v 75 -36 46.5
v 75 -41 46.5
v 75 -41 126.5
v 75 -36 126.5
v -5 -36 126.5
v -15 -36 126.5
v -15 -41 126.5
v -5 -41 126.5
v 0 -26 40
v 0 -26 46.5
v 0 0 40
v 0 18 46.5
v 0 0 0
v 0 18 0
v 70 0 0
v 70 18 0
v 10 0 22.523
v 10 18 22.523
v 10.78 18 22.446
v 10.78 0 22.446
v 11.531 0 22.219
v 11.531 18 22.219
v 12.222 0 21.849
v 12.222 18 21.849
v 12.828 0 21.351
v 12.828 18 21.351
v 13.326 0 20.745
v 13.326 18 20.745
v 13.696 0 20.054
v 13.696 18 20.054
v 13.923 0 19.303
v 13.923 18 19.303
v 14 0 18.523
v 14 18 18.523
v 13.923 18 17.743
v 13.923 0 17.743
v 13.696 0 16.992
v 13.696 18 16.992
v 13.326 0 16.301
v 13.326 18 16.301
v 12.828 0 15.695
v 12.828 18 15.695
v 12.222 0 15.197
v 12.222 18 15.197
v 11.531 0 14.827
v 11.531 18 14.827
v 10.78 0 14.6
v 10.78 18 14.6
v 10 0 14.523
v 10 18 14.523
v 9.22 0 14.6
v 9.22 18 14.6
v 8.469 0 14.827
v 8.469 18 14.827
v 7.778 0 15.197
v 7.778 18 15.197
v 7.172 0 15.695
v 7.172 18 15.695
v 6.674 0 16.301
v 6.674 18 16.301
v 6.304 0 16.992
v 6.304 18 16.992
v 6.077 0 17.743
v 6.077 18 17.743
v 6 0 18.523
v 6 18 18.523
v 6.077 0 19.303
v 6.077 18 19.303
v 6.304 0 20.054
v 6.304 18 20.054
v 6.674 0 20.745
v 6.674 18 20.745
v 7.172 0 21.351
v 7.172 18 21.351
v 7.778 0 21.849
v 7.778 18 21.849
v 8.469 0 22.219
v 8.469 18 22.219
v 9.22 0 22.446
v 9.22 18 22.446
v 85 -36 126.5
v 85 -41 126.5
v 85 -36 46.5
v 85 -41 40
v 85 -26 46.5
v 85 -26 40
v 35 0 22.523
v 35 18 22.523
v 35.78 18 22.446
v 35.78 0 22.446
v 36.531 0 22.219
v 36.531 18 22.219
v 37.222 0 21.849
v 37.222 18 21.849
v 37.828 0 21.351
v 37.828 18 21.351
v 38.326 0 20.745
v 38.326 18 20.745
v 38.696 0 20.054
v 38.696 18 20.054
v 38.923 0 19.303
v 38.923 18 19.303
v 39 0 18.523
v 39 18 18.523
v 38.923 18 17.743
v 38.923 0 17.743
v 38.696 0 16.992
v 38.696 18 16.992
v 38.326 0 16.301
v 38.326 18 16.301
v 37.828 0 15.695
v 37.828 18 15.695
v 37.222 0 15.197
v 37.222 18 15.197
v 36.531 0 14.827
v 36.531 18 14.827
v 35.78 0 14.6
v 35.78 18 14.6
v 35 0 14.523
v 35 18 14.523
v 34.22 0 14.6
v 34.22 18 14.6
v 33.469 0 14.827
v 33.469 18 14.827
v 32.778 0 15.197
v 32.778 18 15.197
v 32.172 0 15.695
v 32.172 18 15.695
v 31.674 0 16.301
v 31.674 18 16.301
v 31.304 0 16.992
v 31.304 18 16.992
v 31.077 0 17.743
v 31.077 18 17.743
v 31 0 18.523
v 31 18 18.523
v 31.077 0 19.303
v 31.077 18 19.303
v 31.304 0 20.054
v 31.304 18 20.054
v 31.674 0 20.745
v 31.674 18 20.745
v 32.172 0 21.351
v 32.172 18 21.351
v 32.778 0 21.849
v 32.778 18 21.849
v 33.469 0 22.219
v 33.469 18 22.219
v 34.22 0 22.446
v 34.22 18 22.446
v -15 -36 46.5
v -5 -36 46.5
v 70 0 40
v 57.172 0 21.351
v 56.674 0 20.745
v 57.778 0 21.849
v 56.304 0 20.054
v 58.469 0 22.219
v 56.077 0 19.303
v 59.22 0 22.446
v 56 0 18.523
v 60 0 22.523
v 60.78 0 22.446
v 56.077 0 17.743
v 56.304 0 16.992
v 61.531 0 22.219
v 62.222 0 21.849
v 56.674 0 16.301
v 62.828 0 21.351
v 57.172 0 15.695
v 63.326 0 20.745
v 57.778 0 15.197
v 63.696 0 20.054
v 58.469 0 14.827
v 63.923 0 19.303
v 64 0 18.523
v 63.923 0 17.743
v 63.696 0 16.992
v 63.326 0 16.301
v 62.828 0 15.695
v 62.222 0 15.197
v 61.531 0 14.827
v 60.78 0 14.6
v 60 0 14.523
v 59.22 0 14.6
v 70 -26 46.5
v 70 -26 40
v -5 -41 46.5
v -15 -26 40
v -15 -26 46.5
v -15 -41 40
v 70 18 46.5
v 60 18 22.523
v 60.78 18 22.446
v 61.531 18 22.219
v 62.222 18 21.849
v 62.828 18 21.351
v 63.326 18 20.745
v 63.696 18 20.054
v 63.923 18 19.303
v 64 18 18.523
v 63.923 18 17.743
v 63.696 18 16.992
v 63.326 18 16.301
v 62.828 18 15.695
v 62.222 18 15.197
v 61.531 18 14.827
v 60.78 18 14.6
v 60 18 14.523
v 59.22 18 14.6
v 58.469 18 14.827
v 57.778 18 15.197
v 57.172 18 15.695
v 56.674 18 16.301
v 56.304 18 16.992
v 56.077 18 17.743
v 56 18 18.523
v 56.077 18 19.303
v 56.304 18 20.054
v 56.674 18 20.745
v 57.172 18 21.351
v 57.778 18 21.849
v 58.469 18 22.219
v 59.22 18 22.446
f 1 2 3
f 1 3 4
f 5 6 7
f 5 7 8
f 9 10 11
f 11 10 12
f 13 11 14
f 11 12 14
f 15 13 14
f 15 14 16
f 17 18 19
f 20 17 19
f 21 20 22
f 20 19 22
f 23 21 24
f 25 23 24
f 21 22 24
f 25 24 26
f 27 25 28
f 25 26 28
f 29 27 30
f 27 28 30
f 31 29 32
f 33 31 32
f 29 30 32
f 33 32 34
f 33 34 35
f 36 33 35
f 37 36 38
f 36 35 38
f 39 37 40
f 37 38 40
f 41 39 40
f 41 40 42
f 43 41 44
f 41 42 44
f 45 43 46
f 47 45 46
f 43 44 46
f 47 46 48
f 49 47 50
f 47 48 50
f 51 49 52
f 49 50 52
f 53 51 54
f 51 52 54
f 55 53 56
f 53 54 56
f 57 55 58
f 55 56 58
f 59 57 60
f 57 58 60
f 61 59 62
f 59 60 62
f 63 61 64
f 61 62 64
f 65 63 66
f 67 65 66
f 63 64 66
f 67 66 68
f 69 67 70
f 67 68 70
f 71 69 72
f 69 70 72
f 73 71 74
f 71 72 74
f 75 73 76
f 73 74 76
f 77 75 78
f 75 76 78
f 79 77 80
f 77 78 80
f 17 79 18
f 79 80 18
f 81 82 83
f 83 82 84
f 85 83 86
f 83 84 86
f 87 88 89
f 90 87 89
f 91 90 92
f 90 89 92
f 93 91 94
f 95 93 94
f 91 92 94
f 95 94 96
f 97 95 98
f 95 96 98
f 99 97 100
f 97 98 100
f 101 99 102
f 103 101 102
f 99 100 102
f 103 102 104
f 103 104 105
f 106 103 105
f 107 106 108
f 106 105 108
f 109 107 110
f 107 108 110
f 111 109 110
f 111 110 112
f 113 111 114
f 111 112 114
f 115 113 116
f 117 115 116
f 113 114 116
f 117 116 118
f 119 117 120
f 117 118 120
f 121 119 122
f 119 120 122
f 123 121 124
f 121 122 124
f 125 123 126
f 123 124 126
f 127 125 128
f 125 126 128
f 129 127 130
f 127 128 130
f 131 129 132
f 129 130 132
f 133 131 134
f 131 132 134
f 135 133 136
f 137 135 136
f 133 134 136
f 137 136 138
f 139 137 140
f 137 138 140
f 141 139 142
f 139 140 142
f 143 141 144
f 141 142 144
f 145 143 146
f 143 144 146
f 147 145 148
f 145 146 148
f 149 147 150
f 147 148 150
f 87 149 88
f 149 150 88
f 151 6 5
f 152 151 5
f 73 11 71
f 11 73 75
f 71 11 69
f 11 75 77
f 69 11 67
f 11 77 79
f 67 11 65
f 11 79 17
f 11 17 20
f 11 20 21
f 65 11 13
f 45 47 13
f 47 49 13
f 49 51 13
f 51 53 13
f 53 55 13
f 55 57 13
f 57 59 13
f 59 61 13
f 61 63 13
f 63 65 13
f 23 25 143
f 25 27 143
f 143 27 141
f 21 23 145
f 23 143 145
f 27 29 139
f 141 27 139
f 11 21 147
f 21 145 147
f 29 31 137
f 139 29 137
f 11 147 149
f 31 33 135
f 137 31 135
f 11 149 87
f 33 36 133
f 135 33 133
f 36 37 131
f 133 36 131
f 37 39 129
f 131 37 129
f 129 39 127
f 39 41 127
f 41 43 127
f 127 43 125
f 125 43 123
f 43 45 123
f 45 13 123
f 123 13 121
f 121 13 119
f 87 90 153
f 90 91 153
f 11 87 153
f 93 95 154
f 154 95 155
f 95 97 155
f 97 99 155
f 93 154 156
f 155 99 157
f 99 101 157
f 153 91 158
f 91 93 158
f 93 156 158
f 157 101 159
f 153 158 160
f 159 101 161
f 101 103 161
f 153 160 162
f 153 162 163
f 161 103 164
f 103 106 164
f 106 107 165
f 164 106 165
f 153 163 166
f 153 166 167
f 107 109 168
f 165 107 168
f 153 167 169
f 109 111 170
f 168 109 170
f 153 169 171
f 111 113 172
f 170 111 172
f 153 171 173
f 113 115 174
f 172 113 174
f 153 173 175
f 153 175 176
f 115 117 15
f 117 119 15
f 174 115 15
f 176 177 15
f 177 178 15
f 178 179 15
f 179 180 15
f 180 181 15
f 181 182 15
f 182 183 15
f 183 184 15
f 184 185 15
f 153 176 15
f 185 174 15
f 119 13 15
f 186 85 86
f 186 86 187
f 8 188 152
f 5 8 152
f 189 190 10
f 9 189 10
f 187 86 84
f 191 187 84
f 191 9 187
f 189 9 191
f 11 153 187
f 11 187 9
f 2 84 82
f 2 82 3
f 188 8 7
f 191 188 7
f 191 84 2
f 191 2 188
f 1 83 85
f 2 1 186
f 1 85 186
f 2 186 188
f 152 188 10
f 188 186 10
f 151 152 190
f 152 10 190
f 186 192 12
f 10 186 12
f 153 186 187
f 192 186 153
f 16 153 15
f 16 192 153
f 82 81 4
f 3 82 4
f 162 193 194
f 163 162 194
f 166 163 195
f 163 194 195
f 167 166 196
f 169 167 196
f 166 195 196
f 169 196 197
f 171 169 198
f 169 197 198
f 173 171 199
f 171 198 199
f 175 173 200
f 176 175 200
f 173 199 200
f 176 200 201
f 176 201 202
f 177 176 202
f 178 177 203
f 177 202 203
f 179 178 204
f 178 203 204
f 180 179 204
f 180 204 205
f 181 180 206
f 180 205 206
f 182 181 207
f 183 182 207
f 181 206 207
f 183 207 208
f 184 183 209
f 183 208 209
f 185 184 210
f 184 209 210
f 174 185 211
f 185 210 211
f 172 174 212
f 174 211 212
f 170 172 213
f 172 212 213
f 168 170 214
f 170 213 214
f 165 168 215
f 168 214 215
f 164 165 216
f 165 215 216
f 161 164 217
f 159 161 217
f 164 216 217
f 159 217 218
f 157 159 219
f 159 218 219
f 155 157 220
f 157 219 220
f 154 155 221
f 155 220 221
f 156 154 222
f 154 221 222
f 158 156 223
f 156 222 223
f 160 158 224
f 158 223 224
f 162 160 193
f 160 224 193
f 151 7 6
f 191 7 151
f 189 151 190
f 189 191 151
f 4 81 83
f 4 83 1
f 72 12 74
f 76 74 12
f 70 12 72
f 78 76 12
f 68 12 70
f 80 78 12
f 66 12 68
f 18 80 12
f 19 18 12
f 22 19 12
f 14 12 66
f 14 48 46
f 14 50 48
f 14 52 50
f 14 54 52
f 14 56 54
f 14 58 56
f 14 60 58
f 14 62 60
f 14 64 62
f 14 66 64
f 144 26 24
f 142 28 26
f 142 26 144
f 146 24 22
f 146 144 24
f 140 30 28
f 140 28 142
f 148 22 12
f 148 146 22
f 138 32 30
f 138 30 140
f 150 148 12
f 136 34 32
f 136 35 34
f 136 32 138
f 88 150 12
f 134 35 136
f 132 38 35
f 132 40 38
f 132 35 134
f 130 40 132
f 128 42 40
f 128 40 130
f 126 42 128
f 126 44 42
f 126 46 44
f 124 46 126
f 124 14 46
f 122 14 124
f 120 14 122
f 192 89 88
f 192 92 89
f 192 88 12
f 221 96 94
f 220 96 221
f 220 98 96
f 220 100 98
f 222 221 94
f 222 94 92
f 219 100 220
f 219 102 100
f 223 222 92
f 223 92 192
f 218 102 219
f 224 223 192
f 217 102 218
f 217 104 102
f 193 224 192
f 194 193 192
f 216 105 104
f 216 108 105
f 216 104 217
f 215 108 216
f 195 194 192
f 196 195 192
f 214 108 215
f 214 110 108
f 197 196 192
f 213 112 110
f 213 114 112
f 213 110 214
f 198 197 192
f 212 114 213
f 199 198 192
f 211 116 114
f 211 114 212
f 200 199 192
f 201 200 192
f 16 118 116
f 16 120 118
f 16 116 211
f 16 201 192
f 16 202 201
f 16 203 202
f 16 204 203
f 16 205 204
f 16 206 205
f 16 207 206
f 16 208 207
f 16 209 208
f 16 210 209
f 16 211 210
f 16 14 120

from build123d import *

# Parameters (mm, degrees)
SKETCH_1_W          = 70
SKETCH_1_H          = 40
EXTRUDE_1_DEPTH     = 18
SKETCH_3_W          = 70
SKETCH_3_H          = 6.5
EXTRUDE_2_DEPTH     = 59
SKETCH_4_W          = 15
SKETCH_4_H          = 15
EXTRUDE_3_DEPTH     = 6.5
SKETCH_5_W          = 10
SKETCH_5_H          = 5
EXTRUDE_4_DEPTH     = 80
SKETCH_7_R          = 4
CUT_EXTRUDE_1_DEPTH = 18


with BuildPart() as part:
    # 草图1 → 凸台-拉伸1 (new body)
    with BuildSketch(Plane(origin=(0, 0, 0), x_dir=(1, 0, 0), z_dir=(0, 1, 0))):
        with Locations((35, -20)):
            Rectangle(SKETCH_1_W, SKETCH_1_H)
    extrude(amount=EXTRUDE_1_DEPTH)

    # 草图3 → 凸台-拉伸2 (add)
    with BuildSketch(Plane(origin=(0, 18, 0), x_dir=(1, 0, 0), z_dir=(0, 1, 0))):
        with Locations((35, -43.25)):
            Rectangle(SKETCH_3_W, SKETCH_3_H)
    extrude(amount=-EXTRUDE_2_DEPTH)

    # 草图4 → 凸台-拉伸3 (add)
    with BuildSketch(Plane.XY.offset(46.5)):
        with Locations((-7.5, -33.5)):
            Rectangle(SKETCH_4_W, SKETCH_4_H)
    extrude_3 = extrude(amount=-EXTRUDE_3_DEPTH)

    # 镜向1: 凸台-拉伸3 across plane
    add(extrude_3.mirror(Plane(origin=(35, 0, 0), x_dir=(0, 0, 1), z_dir=(1, 0, 0))))

    # 草图5 → 凸台-拉伸4 (add)
    with BuildSketch(Plane.XY.offset(46.5)):
        with Locations((-10, -38.5)):
            Rectangle(SKETCH_5_W, SKETCH_5_H)
    extrude_4 = extrude(amount=EXTRUDE_4_DEPTH)

    # 镜向2: 凸台-拉伸4 across plane
    add(extrude_4.mirror(Plane(origin=(35, 0, 0), x_dir=(0, 0, 1), z_dir=(1, 0, 0))))

    # 草图7 → 切除-拉伸1 (cut)
    with BuildSketch(Plane(origin=(0, 18, 0), x_dir=(1, 0, 0), z_dir=(0, 1, 0))):
        with Locations(Location((35, -18.523, 0), (0, 0, 270))):
            Circle(SKETCH_7_R)
        with Locations(Location((60, -18.523, 0), (0, 0, 270))):
            Circle(SKETCH_7_R)
        with Locations(Location((10, -18.523, 0), (0, 0, 270))):
            Circle(SKETCH_7_R)
    extrude(amount=-CUT_EXTRUDE_1_DEPTH, mode=Mode.SUBTRACT)


solid = part.part
